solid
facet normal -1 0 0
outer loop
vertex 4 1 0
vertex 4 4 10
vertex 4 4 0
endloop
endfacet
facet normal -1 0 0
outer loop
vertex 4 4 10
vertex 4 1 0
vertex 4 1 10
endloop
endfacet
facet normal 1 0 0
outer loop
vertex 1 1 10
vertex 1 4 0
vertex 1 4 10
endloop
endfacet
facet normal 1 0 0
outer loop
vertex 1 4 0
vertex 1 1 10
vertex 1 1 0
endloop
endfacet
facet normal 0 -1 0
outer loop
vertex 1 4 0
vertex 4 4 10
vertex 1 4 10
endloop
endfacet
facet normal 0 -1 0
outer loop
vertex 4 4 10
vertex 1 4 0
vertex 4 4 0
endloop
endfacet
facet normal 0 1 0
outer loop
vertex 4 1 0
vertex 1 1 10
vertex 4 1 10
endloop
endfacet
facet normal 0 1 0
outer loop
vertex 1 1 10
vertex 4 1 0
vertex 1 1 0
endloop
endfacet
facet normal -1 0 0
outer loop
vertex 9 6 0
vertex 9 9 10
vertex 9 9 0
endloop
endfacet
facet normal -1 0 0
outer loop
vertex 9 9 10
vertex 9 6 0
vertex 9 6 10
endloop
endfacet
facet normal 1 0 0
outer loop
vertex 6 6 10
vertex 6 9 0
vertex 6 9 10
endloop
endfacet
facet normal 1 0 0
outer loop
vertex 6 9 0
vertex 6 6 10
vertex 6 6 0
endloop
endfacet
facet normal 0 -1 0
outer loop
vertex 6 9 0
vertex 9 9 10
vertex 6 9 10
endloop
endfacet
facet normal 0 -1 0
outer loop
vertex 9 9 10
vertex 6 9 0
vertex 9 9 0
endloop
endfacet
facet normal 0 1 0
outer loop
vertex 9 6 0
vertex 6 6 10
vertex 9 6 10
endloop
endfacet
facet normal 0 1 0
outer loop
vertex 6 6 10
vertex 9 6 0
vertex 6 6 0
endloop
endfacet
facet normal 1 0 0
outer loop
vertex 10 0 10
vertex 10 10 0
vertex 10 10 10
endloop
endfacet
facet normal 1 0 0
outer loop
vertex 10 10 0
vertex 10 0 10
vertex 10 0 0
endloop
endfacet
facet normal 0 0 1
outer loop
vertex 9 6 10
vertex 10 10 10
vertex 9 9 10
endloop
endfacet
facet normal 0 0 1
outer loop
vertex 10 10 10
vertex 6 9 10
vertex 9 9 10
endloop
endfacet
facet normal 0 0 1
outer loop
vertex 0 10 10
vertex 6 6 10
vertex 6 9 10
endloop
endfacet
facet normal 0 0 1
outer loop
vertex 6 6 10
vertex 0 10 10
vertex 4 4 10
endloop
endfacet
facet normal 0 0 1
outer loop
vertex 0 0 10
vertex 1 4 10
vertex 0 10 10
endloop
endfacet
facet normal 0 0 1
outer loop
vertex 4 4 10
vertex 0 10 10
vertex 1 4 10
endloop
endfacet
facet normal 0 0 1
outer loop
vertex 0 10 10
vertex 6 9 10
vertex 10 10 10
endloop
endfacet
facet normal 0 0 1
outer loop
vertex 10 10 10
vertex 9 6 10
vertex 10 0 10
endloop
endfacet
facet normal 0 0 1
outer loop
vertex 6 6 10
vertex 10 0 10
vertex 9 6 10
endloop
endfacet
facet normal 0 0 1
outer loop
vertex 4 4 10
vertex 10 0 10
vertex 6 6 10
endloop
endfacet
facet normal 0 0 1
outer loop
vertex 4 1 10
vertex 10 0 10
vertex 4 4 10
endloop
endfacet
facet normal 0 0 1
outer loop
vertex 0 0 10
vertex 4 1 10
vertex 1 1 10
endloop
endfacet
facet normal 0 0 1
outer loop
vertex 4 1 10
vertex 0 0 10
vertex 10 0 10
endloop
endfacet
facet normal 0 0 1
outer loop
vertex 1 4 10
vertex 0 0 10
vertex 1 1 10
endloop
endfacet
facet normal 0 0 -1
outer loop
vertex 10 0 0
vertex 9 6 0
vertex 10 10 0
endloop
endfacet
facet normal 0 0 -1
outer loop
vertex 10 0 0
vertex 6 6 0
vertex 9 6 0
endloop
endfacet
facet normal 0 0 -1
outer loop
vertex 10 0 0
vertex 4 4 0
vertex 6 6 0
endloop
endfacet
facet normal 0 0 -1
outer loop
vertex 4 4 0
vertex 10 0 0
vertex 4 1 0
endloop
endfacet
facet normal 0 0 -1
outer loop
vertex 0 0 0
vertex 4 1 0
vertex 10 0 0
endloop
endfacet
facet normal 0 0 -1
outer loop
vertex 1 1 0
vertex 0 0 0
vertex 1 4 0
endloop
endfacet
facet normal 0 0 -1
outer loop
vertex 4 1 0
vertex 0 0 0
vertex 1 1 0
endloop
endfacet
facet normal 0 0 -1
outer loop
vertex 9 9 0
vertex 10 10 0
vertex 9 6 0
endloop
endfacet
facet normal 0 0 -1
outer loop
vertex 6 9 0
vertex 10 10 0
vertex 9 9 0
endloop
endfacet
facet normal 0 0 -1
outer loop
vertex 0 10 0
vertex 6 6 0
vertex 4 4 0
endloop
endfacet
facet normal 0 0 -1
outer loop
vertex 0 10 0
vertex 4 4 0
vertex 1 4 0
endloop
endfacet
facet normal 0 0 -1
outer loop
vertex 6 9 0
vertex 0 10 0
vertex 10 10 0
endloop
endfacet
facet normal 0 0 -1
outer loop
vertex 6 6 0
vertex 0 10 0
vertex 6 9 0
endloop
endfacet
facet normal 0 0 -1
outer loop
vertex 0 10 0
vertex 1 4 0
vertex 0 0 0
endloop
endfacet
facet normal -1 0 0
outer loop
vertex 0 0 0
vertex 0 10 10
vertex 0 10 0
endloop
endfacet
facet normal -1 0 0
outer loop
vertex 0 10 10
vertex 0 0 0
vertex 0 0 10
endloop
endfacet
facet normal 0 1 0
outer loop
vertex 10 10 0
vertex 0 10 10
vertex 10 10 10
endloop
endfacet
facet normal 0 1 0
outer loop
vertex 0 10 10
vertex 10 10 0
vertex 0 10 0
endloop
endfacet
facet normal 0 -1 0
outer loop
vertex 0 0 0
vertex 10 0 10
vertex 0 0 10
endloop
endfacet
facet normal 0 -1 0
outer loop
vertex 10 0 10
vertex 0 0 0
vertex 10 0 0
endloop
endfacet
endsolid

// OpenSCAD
difference() {
    cube(10);
    union() {
        translate([1,1,-1]) cube([3,3,12]);
        translate([6,6,-1]) cube([3,3,12]);
    }
}
